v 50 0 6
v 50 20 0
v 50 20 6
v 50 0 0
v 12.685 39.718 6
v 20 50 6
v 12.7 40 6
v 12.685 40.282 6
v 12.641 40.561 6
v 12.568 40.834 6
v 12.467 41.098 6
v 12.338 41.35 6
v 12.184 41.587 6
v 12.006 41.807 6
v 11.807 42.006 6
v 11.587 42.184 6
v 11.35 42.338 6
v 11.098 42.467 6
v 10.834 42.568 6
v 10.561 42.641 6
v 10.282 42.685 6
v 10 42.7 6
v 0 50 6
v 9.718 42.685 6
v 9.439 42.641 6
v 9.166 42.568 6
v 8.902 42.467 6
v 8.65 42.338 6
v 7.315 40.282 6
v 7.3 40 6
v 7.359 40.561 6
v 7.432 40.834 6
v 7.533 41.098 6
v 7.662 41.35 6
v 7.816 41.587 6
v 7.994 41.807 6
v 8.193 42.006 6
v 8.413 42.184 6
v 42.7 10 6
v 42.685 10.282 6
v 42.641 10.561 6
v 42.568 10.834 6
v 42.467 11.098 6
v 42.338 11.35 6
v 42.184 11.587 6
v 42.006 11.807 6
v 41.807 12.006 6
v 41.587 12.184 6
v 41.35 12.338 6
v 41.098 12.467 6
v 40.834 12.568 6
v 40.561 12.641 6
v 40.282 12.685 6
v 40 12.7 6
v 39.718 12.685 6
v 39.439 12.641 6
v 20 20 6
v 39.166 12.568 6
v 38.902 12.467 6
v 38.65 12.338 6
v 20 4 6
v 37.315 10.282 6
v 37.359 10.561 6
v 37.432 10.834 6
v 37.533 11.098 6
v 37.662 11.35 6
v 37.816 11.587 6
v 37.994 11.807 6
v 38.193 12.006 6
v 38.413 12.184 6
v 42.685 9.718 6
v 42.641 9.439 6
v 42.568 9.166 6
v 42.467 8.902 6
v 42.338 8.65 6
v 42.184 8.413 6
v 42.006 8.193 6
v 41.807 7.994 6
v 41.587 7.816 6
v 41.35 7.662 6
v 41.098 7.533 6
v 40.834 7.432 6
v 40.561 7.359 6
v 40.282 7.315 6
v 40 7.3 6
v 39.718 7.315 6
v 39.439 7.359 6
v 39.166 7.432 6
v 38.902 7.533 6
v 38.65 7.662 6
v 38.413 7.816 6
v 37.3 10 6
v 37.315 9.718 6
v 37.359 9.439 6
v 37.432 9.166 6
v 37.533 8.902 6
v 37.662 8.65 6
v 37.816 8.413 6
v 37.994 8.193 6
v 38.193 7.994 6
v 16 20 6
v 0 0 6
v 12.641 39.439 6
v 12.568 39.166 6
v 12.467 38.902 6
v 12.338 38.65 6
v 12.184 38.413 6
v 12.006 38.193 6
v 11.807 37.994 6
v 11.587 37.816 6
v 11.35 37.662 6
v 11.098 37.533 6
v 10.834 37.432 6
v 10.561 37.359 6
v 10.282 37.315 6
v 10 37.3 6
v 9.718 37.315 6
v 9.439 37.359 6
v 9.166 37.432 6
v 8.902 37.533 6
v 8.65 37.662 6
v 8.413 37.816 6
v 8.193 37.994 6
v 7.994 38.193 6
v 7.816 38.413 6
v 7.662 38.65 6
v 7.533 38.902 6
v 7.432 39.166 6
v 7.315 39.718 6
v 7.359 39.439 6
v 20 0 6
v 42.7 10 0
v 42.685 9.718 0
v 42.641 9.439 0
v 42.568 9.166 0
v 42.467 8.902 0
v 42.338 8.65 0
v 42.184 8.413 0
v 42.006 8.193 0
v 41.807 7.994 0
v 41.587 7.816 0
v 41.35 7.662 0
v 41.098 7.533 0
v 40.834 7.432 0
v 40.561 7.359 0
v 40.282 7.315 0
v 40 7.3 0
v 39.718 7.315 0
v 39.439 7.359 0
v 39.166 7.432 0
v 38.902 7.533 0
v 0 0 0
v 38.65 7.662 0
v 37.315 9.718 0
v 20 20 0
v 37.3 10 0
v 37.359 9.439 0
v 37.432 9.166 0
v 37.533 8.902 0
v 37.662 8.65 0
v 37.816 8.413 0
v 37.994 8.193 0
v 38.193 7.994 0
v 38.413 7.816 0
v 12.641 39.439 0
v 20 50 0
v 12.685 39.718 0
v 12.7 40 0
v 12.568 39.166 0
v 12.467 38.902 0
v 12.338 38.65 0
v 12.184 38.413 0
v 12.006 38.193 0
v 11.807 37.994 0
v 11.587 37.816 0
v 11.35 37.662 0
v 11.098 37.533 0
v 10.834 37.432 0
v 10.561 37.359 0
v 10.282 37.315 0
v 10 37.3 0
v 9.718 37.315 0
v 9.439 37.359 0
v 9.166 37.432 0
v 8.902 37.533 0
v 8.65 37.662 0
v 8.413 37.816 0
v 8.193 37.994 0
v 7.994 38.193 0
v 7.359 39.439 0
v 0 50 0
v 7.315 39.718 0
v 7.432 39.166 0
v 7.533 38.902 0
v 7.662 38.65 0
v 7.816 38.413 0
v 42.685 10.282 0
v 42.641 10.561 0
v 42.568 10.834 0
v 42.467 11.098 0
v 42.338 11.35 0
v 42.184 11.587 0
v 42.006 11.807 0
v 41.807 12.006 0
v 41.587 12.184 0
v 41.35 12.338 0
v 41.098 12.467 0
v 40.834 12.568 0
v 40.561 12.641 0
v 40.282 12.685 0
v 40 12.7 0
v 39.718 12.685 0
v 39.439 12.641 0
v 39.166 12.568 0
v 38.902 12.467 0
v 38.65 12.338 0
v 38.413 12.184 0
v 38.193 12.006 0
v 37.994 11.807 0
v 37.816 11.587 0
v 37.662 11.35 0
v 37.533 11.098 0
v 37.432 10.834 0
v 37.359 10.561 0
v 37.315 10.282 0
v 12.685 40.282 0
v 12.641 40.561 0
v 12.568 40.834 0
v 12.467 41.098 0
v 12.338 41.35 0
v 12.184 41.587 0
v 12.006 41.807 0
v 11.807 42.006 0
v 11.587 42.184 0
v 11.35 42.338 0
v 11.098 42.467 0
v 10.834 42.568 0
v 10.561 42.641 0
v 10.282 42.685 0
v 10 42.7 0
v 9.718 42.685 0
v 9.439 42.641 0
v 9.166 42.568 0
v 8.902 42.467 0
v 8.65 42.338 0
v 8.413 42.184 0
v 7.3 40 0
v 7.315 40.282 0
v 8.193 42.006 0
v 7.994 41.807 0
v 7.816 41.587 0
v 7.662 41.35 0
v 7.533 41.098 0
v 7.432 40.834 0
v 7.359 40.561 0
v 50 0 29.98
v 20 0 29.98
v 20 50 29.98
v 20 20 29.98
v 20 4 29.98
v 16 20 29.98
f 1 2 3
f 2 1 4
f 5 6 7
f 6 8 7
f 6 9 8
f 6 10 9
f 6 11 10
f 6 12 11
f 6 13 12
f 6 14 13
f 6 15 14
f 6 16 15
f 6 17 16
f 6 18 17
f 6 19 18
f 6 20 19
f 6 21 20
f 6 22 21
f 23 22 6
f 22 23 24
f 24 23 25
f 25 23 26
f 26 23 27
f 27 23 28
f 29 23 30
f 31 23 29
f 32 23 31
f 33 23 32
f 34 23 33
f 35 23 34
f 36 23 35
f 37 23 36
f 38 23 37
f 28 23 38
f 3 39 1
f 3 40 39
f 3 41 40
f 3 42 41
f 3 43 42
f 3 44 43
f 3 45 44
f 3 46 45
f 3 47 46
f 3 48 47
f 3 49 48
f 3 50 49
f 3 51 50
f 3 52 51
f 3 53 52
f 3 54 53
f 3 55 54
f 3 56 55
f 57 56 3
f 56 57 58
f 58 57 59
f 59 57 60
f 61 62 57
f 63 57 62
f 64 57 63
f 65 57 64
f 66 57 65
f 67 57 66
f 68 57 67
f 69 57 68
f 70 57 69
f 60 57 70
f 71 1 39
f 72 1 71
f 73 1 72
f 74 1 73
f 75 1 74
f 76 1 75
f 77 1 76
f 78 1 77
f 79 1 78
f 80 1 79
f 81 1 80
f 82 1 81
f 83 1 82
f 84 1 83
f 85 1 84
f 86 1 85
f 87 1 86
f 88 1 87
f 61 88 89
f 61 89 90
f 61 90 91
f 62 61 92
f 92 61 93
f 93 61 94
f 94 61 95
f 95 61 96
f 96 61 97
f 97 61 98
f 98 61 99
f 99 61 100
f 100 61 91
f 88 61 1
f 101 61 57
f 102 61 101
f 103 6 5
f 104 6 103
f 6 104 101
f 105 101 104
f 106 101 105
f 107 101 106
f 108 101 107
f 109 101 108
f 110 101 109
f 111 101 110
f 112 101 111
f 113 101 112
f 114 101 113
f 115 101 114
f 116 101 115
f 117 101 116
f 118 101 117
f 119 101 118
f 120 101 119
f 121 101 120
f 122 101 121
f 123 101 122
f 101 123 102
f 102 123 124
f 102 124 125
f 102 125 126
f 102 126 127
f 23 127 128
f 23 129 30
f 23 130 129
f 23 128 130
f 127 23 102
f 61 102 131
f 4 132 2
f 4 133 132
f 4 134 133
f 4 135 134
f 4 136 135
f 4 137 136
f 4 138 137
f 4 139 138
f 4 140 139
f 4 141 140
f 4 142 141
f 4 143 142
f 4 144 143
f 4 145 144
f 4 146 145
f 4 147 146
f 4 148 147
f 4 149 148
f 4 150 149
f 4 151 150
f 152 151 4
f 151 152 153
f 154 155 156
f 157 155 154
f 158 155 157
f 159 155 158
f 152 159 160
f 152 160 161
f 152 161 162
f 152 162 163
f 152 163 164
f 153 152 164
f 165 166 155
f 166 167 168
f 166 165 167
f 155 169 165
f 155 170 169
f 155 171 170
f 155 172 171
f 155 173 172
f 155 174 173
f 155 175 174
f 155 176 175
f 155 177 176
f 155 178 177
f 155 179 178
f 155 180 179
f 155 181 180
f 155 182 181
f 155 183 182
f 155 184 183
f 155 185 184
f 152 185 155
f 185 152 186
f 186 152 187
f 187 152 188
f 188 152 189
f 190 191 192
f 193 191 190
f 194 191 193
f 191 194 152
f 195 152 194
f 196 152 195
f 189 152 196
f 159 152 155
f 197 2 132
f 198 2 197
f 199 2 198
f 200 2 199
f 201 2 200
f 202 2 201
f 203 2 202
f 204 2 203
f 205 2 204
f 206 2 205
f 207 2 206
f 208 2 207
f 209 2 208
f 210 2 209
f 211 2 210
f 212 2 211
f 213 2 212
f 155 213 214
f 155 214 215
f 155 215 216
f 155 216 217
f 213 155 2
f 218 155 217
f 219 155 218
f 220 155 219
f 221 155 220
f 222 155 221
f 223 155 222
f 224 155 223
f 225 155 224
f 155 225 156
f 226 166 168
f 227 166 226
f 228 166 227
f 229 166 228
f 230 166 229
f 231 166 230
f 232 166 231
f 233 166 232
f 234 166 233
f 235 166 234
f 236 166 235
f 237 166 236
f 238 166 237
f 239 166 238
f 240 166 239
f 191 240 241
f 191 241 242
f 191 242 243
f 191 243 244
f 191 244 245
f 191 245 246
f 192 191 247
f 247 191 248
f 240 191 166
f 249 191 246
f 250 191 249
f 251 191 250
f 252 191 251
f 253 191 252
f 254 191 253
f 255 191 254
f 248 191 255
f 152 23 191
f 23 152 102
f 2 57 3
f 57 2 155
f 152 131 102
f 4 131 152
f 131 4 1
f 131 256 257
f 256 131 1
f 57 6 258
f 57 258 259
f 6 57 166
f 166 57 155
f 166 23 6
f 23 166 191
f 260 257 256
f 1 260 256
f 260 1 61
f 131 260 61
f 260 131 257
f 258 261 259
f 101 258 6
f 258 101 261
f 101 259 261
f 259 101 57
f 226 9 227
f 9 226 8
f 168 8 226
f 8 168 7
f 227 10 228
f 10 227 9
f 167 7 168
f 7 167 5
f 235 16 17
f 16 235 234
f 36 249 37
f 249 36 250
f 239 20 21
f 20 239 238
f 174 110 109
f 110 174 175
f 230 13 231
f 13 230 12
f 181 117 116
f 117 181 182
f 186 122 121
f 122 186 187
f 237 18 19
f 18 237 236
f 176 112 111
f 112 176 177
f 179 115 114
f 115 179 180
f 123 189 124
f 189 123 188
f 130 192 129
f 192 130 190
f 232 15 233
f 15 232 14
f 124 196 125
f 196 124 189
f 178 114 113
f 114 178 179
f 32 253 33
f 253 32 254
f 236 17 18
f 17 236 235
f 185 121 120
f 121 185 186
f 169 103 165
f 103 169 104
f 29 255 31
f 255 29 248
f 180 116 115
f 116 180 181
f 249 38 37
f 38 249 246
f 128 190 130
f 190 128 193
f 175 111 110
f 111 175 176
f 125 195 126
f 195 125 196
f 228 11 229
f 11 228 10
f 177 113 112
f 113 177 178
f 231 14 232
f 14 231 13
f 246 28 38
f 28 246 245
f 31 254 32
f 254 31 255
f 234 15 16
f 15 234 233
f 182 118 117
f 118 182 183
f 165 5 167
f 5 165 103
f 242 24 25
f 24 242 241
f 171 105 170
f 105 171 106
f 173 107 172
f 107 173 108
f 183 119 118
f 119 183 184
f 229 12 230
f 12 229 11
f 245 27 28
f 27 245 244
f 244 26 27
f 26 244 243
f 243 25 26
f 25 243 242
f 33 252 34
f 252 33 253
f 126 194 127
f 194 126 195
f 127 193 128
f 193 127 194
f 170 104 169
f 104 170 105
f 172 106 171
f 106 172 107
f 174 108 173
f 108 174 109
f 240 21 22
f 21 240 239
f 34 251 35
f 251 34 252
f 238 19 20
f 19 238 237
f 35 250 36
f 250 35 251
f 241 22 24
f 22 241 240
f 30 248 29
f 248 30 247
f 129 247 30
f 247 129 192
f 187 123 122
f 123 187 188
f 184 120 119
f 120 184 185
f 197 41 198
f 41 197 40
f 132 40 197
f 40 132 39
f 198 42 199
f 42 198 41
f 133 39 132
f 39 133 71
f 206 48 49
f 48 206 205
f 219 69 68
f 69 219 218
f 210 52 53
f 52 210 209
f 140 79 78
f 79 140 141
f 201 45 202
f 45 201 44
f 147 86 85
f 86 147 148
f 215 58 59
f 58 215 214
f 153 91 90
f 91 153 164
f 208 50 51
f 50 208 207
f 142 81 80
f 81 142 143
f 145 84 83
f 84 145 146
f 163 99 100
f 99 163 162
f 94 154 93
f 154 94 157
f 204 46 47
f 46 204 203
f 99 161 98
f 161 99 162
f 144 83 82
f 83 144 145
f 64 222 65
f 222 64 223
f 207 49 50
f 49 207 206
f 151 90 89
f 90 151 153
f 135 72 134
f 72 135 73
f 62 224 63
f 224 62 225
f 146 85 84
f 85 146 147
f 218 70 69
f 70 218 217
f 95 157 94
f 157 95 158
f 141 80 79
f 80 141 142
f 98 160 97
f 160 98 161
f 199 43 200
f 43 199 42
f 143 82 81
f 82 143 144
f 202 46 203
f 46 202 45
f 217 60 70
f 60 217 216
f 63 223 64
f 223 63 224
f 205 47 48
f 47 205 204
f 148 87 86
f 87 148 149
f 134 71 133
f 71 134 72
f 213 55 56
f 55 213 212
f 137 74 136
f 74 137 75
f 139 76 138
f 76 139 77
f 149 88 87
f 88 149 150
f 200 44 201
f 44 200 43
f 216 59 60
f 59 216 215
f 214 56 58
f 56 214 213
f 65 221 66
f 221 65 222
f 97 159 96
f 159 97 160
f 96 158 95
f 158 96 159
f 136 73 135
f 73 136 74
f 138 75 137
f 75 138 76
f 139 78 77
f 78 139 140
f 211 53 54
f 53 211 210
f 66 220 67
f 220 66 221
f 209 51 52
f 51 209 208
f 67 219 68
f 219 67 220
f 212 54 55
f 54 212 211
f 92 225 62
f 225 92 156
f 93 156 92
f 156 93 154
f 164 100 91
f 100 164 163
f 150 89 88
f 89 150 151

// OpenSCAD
// 2020 reinforced gusset: reinforced right-angle profile gusset.
$fn = 60;
eps = 0.02;
profile = 20;
arm = 50;
plate_t = 6;
rib_t = 4;
rib_h = 24;
hole_d = 5.4;

module x_rib() {
    translate([profile, 0, plate_t - eps])
        linear_extrude(height = rib_h)
            polygon(points = [[0, 0], [arm - profile, 0], [0, rib_t]]);
}
module y_rib() {
    translate([profile, profile, plate_t - eps]) rotate([0, 0, 90])
        linear_extrude(height = rib_h)
            polygon(points = [[0, 0], [arm - profile, 0], [0, rib_t]]);
}

difference() {
    union() {
        cube([arm, profile, plate_t]);
        cube([profile, arm, plate_t]);
        x_rib();
        y_rib();
    }
    for (p = [[profile / 2, arm - profile / 2], [arm - profile / 2, profile / 2]])
        translate([p[0], p[1], -eps]) cylinder(d = hole_d, h = plate_t + 2 * eps);
}
